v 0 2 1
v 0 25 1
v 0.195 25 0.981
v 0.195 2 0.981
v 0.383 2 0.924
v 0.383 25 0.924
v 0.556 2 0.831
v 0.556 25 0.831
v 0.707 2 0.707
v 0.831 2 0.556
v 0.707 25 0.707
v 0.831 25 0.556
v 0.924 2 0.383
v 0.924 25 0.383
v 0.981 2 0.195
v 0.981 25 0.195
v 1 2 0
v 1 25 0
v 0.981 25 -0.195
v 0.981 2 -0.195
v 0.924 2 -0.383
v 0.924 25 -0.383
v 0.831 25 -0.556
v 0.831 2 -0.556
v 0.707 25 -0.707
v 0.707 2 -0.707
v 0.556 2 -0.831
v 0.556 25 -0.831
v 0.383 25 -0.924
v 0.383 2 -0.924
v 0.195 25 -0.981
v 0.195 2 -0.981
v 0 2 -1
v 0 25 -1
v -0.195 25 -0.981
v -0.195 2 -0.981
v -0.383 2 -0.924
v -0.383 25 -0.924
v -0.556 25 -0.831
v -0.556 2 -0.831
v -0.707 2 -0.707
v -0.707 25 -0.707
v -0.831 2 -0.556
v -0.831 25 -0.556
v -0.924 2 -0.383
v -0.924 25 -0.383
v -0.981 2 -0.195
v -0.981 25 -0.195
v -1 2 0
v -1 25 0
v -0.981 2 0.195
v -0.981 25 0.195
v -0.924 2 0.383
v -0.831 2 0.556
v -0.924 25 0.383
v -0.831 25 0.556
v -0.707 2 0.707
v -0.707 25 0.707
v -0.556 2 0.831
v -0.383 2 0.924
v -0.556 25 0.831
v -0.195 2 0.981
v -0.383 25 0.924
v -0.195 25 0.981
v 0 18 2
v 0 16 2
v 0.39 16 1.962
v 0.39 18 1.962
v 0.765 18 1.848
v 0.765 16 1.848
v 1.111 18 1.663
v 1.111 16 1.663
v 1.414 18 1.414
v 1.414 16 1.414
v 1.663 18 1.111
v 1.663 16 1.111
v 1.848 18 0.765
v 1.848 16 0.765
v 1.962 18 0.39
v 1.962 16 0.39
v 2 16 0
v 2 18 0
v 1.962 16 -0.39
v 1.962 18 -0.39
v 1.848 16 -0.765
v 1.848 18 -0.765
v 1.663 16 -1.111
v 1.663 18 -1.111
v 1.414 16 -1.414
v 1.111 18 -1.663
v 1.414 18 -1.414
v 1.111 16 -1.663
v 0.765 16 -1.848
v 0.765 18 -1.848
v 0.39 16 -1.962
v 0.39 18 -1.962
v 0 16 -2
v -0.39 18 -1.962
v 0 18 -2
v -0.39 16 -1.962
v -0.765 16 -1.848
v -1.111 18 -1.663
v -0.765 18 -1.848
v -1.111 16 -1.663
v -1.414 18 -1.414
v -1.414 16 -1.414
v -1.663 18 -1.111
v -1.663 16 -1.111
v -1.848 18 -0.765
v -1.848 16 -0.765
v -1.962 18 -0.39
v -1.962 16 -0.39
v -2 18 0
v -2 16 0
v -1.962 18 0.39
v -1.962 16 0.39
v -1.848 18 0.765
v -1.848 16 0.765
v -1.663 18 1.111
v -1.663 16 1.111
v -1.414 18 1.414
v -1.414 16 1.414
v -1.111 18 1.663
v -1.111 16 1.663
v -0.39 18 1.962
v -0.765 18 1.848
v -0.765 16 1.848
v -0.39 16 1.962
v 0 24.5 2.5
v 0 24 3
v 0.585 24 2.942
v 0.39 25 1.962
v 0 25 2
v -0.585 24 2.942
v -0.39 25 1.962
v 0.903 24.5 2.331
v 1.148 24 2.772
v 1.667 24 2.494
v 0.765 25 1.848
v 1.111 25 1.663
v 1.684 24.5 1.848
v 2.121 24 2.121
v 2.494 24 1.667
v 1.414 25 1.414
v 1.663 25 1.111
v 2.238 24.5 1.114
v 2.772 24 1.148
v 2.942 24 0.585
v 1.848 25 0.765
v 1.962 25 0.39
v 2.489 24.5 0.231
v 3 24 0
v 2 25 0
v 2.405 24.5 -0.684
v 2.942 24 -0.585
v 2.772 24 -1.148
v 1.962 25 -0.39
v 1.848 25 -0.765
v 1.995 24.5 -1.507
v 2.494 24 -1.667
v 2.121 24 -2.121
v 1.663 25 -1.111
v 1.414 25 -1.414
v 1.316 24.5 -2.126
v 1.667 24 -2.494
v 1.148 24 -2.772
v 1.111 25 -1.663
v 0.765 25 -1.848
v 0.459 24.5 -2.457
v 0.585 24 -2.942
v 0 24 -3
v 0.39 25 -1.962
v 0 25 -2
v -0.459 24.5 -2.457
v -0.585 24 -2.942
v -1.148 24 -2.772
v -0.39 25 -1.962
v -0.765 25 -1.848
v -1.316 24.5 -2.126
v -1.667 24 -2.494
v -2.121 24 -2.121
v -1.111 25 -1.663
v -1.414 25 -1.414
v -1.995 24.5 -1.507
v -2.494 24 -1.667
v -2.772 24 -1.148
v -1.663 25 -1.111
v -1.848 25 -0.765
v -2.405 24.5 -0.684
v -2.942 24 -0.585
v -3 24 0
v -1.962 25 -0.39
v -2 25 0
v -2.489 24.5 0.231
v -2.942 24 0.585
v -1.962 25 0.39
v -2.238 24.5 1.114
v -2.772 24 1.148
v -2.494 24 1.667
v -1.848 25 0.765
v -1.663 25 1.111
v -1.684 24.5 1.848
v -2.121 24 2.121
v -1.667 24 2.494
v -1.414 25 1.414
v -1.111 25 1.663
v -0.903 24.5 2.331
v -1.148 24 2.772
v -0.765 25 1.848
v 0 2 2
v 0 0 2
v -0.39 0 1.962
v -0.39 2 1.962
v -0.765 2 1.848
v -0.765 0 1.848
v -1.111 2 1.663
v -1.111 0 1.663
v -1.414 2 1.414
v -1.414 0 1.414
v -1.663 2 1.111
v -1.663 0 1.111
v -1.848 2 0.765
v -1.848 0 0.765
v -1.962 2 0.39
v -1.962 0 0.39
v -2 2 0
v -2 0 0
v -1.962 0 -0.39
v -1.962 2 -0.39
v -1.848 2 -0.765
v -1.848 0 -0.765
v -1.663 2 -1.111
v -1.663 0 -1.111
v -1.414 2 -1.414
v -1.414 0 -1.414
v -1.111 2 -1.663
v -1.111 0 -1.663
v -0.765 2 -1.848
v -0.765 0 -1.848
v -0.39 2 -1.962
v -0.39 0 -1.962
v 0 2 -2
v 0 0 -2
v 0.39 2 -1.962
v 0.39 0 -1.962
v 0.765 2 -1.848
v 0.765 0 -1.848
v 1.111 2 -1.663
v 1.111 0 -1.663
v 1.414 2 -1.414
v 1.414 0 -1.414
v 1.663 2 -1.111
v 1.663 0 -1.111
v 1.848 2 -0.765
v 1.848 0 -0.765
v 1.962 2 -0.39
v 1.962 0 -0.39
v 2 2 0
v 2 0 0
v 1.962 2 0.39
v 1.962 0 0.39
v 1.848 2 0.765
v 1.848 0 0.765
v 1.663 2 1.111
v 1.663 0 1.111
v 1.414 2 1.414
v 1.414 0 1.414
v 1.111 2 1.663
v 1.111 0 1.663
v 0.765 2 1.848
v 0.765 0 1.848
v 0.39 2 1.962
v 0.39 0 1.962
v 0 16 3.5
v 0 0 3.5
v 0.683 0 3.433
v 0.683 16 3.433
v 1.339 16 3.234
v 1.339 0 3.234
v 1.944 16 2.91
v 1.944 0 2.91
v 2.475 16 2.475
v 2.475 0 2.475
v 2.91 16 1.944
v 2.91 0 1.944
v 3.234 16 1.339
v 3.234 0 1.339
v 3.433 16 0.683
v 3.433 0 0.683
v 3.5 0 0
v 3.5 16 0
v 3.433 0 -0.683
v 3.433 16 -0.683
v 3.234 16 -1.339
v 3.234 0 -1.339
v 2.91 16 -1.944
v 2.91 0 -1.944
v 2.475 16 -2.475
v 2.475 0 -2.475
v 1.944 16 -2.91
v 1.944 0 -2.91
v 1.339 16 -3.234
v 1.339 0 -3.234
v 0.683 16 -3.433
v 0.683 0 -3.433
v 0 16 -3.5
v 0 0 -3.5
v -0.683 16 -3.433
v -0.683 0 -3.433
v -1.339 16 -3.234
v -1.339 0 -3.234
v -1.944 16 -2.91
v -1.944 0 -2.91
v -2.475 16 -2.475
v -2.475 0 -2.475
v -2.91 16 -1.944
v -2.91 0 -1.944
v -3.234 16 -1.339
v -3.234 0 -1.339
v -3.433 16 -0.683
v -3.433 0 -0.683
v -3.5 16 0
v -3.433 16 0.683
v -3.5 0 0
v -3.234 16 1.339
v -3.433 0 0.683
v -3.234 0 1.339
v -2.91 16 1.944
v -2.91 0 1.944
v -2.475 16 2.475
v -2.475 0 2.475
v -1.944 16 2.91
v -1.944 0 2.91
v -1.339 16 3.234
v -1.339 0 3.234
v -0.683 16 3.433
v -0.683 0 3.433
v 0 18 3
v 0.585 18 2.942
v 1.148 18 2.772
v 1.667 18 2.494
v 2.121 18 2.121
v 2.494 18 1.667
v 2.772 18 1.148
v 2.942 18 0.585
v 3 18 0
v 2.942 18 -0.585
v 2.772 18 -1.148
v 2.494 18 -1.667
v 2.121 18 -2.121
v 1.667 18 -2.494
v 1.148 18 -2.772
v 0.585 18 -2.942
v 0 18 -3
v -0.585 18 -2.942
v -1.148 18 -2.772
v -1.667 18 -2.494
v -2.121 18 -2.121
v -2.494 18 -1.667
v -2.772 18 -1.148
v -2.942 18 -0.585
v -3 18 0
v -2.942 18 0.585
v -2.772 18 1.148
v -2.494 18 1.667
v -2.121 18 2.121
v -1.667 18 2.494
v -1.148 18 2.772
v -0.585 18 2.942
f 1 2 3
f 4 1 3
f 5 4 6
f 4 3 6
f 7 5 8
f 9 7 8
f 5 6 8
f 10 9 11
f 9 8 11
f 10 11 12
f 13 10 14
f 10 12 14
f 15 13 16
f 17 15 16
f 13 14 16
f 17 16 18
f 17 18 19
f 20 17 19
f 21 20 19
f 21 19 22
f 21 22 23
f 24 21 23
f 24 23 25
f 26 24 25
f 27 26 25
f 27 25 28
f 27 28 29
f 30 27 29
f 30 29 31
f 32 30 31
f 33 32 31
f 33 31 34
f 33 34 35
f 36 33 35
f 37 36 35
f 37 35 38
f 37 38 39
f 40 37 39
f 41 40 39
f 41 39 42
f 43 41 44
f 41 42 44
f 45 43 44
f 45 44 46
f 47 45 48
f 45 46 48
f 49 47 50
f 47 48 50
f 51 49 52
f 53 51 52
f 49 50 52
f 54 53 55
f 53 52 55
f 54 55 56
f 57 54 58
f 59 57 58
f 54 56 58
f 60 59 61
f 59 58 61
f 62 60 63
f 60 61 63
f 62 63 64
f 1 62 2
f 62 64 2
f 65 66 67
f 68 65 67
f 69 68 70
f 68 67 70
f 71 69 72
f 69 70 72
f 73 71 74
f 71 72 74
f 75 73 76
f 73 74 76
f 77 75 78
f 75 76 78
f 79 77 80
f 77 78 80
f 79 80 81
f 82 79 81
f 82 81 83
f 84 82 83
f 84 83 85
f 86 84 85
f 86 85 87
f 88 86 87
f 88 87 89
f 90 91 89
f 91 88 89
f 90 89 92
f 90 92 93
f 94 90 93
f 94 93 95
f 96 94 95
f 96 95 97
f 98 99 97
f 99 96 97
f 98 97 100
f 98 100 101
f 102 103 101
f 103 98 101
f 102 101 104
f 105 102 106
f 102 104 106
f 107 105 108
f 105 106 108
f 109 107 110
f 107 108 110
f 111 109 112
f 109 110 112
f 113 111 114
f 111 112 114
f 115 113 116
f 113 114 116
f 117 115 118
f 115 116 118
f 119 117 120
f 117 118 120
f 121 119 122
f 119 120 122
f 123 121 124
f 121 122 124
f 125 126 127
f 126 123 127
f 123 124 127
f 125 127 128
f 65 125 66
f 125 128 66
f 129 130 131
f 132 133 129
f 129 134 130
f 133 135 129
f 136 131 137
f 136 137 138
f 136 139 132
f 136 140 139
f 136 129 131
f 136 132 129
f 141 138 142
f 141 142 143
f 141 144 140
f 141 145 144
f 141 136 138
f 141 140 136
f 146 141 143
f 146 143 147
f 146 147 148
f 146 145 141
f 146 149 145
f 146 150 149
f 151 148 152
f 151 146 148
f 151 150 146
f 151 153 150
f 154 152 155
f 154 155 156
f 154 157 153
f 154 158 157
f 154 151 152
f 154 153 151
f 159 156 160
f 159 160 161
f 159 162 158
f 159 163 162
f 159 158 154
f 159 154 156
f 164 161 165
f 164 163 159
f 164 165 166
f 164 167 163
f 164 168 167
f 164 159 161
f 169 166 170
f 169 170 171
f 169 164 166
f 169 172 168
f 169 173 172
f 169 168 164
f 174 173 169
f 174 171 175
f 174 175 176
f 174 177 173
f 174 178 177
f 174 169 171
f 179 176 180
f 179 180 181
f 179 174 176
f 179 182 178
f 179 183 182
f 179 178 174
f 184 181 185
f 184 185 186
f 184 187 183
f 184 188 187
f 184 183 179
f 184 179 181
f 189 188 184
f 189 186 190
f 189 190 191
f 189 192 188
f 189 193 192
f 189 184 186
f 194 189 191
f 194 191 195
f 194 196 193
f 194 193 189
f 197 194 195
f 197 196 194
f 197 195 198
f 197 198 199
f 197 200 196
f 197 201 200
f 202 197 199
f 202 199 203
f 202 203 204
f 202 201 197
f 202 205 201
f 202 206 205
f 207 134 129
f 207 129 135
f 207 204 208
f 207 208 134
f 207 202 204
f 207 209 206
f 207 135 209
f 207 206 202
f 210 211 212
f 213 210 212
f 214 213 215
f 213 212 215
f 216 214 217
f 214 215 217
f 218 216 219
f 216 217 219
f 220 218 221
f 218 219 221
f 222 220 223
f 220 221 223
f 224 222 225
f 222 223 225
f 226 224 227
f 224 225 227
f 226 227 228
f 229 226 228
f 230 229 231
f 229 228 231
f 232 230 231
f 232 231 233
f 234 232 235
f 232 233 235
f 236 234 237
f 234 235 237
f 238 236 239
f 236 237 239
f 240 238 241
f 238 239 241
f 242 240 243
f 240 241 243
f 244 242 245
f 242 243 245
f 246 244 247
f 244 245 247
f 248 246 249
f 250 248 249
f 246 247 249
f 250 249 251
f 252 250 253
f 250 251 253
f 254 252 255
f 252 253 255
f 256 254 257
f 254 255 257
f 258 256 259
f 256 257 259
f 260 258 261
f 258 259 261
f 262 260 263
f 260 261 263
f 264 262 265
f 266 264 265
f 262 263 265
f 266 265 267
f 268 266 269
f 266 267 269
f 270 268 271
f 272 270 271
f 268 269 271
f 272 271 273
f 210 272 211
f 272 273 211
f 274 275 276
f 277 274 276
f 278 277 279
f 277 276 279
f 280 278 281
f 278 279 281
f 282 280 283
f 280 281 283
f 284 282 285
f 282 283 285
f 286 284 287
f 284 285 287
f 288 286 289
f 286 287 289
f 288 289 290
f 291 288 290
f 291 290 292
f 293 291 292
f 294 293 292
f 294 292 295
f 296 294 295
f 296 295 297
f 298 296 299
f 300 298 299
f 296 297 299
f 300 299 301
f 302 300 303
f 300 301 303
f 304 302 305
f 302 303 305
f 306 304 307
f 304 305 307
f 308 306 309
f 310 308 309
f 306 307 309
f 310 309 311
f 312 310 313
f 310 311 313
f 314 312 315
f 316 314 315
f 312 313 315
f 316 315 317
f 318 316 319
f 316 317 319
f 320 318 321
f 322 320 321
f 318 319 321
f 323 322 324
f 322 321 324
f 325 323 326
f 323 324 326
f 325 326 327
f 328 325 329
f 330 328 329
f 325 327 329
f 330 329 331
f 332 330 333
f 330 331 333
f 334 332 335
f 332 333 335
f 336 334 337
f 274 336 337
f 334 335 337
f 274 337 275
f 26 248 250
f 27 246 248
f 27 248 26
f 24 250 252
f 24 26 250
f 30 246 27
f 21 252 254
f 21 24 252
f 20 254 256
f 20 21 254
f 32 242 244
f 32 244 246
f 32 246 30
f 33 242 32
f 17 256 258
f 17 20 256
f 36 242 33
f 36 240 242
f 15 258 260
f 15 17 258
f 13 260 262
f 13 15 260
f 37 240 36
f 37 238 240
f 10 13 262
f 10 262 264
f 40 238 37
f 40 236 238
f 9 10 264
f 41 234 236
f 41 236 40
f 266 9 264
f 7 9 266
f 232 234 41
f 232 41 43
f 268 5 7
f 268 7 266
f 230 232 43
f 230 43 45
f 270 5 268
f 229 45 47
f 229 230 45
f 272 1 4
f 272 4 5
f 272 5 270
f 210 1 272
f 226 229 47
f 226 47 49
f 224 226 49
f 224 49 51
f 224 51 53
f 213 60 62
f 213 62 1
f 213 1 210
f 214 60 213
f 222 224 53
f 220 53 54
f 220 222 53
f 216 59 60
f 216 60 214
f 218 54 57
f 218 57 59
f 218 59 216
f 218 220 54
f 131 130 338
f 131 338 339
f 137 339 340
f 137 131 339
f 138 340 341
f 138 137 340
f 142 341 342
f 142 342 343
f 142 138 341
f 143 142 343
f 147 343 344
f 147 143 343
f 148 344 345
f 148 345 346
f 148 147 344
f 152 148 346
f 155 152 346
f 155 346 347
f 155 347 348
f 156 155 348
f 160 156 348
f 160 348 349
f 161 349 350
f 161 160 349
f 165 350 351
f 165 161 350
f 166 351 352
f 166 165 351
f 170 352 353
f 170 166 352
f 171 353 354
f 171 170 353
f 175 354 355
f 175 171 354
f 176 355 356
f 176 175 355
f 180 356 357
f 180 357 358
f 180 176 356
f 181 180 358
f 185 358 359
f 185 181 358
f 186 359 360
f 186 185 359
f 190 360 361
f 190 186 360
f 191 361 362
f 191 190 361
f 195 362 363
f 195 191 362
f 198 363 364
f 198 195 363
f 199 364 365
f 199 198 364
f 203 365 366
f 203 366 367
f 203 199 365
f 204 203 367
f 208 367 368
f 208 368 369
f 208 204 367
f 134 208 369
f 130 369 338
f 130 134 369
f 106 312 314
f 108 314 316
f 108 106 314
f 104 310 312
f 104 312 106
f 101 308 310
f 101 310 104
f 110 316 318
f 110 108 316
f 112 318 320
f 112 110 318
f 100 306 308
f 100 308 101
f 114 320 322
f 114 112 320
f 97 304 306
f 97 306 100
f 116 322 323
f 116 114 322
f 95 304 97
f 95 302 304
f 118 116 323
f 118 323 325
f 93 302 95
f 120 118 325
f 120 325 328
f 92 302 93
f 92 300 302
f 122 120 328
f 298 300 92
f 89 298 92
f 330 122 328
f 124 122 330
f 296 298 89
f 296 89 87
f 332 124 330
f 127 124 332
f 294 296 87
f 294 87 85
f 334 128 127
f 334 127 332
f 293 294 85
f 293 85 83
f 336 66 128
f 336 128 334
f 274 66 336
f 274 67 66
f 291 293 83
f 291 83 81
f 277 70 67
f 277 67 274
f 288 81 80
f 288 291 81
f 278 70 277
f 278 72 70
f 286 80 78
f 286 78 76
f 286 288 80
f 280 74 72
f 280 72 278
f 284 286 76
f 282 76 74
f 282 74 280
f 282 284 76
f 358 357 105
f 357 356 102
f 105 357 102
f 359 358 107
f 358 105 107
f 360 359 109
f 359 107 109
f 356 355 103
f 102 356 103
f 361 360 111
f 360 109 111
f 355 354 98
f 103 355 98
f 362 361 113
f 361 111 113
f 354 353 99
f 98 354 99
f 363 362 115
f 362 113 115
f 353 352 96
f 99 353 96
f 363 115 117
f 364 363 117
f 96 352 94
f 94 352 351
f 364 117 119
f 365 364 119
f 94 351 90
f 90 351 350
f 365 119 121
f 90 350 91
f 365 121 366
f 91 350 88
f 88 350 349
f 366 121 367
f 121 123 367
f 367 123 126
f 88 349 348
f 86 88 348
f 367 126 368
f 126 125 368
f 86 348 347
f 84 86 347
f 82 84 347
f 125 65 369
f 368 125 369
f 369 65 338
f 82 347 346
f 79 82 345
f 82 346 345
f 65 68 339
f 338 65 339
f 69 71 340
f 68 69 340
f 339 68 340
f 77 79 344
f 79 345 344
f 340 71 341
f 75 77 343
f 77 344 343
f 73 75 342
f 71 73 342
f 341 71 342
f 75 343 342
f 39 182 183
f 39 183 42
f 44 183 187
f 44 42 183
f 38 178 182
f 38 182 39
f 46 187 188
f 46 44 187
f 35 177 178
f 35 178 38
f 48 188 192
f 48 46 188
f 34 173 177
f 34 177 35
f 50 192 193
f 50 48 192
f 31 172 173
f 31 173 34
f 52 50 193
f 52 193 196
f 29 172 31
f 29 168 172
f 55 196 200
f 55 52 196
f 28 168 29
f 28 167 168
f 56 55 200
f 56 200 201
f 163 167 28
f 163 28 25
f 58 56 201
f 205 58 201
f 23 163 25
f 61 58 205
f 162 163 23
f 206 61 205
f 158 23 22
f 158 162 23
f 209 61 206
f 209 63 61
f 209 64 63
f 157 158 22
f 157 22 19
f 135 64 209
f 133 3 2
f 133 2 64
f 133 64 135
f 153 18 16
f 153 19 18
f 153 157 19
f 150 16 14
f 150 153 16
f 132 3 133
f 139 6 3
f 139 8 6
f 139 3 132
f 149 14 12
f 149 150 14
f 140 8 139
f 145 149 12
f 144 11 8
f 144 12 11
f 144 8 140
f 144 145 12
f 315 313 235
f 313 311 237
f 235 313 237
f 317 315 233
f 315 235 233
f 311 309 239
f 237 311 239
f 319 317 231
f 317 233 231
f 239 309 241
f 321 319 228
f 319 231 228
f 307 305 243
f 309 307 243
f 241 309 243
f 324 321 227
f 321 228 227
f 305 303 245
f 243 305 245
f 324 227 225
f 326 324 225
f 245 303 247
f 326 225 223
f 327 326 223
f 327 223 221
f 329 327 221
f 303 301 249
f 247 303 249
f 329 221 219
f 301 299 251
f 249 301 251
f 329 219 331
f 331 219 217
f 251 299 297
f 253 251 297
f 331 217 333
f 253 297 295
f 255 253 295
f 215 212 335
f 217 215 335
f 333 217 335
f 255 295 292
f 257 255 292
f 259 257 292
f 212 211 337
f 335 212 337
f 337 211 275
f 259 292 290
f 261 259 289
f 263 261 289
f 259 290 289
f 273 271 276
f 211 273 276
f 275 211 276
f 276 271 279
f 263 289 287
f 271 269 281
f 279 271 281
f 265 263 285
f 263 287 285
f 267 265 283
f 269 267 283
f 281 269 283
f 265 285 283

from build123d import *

# Parameters (mm, degrees)
SKETCH_1_R          = 3.5
EXTRUDE_1_DEPTH     = 16
SKETCH_2_R          = 2
EXTRUDE_2_DEPTH     = 25
SKETCH_3_R          = 3
EXTRUDE_3_DEPTH     = 7
CHAMFER_1_SIZE      = 1
SKETCH_4_R          = 1
CUT_EXTRUDE_1_DEPTH = 26.485289875
SKETCH_5_R          = 2
CUT_EXTRUDE_2_DEPTH = 2


with BuildPart() as part:
    # 草圖1 → 填料-伸長1 (new body)
    with BuildSketch(Plane(origin=(0, 0, 0), x_dir=(1, 0, 0), z_dir=(0, 1, 0))):
        with Locations(Location((0, 0, 0), (0, 0, 270))):
            Circle(SKETCH_1_R)
    extrude(amount=EXTRUDE_1_DEPTH)

    # 草圖2 → 填料-伸長2 (add)
    with BuildSketch(Plane(origin=(0, 0, 0), x_dir=(1, 0, 0), z_dir=(0, 1, 0))):
        with Locations(Location((0, 0, 0), (0, 0, 270))):
            Circle(SKETCH_2_R)
    extrude(amount=EXTRUDE_2_DEPTH)

    # 草圖3 → 填料-伸長3 (add)
    with BuildSketch(Plane(origin=(0, 25, 0), x_dir=(1, 0, 0), z_dir=(0, 1, 0))):
        with Locations(Location((0, 0, 0), (0, 0, 270))):
            Circle(SKETCH_3_R)
    extrude(amount=-EXTRUDE_3_DEPTH)

    # 導角1
    chamfer_1_edges = [part.edges().sort_by_distance(p)[0] for p in [
        (0, 25, -3),
    ]]
    chamfer(chamfer_1_edges, length=CHAMFER_1_SIZE)

    # 草圖4 → 除料-伸長1 (cut, through all)
    with BuildSketch(Plane(origin=(0, 25, 0), x_dir=(1, 0, 0), z_dir=(0, 1, 0))):
        with Locations(Location((0, 0, 0), (0, 0, 270))):
            Circle(SKETCH_4_R)
    extrude(amount=-CUT_EXTRUDE_1_DEPTH, mode=Mode.SUBTRACT)

    # 草圖5 → 除料-伸長2 (cut)
    with BuildSketch(Plane(origin=(0, 0, 0), x_dir=(-1, 0, 0), z_dir=(0, -1, 0))):
        with Locations(Location((0, 0, 0), (0, 0, 270))):
            Circle(SKETCH_5_R)
    extrude(amount=-CUT_EXTRUDE_2_DEPTH, mode=Mode.SUBTRACT)


solid = part.part
